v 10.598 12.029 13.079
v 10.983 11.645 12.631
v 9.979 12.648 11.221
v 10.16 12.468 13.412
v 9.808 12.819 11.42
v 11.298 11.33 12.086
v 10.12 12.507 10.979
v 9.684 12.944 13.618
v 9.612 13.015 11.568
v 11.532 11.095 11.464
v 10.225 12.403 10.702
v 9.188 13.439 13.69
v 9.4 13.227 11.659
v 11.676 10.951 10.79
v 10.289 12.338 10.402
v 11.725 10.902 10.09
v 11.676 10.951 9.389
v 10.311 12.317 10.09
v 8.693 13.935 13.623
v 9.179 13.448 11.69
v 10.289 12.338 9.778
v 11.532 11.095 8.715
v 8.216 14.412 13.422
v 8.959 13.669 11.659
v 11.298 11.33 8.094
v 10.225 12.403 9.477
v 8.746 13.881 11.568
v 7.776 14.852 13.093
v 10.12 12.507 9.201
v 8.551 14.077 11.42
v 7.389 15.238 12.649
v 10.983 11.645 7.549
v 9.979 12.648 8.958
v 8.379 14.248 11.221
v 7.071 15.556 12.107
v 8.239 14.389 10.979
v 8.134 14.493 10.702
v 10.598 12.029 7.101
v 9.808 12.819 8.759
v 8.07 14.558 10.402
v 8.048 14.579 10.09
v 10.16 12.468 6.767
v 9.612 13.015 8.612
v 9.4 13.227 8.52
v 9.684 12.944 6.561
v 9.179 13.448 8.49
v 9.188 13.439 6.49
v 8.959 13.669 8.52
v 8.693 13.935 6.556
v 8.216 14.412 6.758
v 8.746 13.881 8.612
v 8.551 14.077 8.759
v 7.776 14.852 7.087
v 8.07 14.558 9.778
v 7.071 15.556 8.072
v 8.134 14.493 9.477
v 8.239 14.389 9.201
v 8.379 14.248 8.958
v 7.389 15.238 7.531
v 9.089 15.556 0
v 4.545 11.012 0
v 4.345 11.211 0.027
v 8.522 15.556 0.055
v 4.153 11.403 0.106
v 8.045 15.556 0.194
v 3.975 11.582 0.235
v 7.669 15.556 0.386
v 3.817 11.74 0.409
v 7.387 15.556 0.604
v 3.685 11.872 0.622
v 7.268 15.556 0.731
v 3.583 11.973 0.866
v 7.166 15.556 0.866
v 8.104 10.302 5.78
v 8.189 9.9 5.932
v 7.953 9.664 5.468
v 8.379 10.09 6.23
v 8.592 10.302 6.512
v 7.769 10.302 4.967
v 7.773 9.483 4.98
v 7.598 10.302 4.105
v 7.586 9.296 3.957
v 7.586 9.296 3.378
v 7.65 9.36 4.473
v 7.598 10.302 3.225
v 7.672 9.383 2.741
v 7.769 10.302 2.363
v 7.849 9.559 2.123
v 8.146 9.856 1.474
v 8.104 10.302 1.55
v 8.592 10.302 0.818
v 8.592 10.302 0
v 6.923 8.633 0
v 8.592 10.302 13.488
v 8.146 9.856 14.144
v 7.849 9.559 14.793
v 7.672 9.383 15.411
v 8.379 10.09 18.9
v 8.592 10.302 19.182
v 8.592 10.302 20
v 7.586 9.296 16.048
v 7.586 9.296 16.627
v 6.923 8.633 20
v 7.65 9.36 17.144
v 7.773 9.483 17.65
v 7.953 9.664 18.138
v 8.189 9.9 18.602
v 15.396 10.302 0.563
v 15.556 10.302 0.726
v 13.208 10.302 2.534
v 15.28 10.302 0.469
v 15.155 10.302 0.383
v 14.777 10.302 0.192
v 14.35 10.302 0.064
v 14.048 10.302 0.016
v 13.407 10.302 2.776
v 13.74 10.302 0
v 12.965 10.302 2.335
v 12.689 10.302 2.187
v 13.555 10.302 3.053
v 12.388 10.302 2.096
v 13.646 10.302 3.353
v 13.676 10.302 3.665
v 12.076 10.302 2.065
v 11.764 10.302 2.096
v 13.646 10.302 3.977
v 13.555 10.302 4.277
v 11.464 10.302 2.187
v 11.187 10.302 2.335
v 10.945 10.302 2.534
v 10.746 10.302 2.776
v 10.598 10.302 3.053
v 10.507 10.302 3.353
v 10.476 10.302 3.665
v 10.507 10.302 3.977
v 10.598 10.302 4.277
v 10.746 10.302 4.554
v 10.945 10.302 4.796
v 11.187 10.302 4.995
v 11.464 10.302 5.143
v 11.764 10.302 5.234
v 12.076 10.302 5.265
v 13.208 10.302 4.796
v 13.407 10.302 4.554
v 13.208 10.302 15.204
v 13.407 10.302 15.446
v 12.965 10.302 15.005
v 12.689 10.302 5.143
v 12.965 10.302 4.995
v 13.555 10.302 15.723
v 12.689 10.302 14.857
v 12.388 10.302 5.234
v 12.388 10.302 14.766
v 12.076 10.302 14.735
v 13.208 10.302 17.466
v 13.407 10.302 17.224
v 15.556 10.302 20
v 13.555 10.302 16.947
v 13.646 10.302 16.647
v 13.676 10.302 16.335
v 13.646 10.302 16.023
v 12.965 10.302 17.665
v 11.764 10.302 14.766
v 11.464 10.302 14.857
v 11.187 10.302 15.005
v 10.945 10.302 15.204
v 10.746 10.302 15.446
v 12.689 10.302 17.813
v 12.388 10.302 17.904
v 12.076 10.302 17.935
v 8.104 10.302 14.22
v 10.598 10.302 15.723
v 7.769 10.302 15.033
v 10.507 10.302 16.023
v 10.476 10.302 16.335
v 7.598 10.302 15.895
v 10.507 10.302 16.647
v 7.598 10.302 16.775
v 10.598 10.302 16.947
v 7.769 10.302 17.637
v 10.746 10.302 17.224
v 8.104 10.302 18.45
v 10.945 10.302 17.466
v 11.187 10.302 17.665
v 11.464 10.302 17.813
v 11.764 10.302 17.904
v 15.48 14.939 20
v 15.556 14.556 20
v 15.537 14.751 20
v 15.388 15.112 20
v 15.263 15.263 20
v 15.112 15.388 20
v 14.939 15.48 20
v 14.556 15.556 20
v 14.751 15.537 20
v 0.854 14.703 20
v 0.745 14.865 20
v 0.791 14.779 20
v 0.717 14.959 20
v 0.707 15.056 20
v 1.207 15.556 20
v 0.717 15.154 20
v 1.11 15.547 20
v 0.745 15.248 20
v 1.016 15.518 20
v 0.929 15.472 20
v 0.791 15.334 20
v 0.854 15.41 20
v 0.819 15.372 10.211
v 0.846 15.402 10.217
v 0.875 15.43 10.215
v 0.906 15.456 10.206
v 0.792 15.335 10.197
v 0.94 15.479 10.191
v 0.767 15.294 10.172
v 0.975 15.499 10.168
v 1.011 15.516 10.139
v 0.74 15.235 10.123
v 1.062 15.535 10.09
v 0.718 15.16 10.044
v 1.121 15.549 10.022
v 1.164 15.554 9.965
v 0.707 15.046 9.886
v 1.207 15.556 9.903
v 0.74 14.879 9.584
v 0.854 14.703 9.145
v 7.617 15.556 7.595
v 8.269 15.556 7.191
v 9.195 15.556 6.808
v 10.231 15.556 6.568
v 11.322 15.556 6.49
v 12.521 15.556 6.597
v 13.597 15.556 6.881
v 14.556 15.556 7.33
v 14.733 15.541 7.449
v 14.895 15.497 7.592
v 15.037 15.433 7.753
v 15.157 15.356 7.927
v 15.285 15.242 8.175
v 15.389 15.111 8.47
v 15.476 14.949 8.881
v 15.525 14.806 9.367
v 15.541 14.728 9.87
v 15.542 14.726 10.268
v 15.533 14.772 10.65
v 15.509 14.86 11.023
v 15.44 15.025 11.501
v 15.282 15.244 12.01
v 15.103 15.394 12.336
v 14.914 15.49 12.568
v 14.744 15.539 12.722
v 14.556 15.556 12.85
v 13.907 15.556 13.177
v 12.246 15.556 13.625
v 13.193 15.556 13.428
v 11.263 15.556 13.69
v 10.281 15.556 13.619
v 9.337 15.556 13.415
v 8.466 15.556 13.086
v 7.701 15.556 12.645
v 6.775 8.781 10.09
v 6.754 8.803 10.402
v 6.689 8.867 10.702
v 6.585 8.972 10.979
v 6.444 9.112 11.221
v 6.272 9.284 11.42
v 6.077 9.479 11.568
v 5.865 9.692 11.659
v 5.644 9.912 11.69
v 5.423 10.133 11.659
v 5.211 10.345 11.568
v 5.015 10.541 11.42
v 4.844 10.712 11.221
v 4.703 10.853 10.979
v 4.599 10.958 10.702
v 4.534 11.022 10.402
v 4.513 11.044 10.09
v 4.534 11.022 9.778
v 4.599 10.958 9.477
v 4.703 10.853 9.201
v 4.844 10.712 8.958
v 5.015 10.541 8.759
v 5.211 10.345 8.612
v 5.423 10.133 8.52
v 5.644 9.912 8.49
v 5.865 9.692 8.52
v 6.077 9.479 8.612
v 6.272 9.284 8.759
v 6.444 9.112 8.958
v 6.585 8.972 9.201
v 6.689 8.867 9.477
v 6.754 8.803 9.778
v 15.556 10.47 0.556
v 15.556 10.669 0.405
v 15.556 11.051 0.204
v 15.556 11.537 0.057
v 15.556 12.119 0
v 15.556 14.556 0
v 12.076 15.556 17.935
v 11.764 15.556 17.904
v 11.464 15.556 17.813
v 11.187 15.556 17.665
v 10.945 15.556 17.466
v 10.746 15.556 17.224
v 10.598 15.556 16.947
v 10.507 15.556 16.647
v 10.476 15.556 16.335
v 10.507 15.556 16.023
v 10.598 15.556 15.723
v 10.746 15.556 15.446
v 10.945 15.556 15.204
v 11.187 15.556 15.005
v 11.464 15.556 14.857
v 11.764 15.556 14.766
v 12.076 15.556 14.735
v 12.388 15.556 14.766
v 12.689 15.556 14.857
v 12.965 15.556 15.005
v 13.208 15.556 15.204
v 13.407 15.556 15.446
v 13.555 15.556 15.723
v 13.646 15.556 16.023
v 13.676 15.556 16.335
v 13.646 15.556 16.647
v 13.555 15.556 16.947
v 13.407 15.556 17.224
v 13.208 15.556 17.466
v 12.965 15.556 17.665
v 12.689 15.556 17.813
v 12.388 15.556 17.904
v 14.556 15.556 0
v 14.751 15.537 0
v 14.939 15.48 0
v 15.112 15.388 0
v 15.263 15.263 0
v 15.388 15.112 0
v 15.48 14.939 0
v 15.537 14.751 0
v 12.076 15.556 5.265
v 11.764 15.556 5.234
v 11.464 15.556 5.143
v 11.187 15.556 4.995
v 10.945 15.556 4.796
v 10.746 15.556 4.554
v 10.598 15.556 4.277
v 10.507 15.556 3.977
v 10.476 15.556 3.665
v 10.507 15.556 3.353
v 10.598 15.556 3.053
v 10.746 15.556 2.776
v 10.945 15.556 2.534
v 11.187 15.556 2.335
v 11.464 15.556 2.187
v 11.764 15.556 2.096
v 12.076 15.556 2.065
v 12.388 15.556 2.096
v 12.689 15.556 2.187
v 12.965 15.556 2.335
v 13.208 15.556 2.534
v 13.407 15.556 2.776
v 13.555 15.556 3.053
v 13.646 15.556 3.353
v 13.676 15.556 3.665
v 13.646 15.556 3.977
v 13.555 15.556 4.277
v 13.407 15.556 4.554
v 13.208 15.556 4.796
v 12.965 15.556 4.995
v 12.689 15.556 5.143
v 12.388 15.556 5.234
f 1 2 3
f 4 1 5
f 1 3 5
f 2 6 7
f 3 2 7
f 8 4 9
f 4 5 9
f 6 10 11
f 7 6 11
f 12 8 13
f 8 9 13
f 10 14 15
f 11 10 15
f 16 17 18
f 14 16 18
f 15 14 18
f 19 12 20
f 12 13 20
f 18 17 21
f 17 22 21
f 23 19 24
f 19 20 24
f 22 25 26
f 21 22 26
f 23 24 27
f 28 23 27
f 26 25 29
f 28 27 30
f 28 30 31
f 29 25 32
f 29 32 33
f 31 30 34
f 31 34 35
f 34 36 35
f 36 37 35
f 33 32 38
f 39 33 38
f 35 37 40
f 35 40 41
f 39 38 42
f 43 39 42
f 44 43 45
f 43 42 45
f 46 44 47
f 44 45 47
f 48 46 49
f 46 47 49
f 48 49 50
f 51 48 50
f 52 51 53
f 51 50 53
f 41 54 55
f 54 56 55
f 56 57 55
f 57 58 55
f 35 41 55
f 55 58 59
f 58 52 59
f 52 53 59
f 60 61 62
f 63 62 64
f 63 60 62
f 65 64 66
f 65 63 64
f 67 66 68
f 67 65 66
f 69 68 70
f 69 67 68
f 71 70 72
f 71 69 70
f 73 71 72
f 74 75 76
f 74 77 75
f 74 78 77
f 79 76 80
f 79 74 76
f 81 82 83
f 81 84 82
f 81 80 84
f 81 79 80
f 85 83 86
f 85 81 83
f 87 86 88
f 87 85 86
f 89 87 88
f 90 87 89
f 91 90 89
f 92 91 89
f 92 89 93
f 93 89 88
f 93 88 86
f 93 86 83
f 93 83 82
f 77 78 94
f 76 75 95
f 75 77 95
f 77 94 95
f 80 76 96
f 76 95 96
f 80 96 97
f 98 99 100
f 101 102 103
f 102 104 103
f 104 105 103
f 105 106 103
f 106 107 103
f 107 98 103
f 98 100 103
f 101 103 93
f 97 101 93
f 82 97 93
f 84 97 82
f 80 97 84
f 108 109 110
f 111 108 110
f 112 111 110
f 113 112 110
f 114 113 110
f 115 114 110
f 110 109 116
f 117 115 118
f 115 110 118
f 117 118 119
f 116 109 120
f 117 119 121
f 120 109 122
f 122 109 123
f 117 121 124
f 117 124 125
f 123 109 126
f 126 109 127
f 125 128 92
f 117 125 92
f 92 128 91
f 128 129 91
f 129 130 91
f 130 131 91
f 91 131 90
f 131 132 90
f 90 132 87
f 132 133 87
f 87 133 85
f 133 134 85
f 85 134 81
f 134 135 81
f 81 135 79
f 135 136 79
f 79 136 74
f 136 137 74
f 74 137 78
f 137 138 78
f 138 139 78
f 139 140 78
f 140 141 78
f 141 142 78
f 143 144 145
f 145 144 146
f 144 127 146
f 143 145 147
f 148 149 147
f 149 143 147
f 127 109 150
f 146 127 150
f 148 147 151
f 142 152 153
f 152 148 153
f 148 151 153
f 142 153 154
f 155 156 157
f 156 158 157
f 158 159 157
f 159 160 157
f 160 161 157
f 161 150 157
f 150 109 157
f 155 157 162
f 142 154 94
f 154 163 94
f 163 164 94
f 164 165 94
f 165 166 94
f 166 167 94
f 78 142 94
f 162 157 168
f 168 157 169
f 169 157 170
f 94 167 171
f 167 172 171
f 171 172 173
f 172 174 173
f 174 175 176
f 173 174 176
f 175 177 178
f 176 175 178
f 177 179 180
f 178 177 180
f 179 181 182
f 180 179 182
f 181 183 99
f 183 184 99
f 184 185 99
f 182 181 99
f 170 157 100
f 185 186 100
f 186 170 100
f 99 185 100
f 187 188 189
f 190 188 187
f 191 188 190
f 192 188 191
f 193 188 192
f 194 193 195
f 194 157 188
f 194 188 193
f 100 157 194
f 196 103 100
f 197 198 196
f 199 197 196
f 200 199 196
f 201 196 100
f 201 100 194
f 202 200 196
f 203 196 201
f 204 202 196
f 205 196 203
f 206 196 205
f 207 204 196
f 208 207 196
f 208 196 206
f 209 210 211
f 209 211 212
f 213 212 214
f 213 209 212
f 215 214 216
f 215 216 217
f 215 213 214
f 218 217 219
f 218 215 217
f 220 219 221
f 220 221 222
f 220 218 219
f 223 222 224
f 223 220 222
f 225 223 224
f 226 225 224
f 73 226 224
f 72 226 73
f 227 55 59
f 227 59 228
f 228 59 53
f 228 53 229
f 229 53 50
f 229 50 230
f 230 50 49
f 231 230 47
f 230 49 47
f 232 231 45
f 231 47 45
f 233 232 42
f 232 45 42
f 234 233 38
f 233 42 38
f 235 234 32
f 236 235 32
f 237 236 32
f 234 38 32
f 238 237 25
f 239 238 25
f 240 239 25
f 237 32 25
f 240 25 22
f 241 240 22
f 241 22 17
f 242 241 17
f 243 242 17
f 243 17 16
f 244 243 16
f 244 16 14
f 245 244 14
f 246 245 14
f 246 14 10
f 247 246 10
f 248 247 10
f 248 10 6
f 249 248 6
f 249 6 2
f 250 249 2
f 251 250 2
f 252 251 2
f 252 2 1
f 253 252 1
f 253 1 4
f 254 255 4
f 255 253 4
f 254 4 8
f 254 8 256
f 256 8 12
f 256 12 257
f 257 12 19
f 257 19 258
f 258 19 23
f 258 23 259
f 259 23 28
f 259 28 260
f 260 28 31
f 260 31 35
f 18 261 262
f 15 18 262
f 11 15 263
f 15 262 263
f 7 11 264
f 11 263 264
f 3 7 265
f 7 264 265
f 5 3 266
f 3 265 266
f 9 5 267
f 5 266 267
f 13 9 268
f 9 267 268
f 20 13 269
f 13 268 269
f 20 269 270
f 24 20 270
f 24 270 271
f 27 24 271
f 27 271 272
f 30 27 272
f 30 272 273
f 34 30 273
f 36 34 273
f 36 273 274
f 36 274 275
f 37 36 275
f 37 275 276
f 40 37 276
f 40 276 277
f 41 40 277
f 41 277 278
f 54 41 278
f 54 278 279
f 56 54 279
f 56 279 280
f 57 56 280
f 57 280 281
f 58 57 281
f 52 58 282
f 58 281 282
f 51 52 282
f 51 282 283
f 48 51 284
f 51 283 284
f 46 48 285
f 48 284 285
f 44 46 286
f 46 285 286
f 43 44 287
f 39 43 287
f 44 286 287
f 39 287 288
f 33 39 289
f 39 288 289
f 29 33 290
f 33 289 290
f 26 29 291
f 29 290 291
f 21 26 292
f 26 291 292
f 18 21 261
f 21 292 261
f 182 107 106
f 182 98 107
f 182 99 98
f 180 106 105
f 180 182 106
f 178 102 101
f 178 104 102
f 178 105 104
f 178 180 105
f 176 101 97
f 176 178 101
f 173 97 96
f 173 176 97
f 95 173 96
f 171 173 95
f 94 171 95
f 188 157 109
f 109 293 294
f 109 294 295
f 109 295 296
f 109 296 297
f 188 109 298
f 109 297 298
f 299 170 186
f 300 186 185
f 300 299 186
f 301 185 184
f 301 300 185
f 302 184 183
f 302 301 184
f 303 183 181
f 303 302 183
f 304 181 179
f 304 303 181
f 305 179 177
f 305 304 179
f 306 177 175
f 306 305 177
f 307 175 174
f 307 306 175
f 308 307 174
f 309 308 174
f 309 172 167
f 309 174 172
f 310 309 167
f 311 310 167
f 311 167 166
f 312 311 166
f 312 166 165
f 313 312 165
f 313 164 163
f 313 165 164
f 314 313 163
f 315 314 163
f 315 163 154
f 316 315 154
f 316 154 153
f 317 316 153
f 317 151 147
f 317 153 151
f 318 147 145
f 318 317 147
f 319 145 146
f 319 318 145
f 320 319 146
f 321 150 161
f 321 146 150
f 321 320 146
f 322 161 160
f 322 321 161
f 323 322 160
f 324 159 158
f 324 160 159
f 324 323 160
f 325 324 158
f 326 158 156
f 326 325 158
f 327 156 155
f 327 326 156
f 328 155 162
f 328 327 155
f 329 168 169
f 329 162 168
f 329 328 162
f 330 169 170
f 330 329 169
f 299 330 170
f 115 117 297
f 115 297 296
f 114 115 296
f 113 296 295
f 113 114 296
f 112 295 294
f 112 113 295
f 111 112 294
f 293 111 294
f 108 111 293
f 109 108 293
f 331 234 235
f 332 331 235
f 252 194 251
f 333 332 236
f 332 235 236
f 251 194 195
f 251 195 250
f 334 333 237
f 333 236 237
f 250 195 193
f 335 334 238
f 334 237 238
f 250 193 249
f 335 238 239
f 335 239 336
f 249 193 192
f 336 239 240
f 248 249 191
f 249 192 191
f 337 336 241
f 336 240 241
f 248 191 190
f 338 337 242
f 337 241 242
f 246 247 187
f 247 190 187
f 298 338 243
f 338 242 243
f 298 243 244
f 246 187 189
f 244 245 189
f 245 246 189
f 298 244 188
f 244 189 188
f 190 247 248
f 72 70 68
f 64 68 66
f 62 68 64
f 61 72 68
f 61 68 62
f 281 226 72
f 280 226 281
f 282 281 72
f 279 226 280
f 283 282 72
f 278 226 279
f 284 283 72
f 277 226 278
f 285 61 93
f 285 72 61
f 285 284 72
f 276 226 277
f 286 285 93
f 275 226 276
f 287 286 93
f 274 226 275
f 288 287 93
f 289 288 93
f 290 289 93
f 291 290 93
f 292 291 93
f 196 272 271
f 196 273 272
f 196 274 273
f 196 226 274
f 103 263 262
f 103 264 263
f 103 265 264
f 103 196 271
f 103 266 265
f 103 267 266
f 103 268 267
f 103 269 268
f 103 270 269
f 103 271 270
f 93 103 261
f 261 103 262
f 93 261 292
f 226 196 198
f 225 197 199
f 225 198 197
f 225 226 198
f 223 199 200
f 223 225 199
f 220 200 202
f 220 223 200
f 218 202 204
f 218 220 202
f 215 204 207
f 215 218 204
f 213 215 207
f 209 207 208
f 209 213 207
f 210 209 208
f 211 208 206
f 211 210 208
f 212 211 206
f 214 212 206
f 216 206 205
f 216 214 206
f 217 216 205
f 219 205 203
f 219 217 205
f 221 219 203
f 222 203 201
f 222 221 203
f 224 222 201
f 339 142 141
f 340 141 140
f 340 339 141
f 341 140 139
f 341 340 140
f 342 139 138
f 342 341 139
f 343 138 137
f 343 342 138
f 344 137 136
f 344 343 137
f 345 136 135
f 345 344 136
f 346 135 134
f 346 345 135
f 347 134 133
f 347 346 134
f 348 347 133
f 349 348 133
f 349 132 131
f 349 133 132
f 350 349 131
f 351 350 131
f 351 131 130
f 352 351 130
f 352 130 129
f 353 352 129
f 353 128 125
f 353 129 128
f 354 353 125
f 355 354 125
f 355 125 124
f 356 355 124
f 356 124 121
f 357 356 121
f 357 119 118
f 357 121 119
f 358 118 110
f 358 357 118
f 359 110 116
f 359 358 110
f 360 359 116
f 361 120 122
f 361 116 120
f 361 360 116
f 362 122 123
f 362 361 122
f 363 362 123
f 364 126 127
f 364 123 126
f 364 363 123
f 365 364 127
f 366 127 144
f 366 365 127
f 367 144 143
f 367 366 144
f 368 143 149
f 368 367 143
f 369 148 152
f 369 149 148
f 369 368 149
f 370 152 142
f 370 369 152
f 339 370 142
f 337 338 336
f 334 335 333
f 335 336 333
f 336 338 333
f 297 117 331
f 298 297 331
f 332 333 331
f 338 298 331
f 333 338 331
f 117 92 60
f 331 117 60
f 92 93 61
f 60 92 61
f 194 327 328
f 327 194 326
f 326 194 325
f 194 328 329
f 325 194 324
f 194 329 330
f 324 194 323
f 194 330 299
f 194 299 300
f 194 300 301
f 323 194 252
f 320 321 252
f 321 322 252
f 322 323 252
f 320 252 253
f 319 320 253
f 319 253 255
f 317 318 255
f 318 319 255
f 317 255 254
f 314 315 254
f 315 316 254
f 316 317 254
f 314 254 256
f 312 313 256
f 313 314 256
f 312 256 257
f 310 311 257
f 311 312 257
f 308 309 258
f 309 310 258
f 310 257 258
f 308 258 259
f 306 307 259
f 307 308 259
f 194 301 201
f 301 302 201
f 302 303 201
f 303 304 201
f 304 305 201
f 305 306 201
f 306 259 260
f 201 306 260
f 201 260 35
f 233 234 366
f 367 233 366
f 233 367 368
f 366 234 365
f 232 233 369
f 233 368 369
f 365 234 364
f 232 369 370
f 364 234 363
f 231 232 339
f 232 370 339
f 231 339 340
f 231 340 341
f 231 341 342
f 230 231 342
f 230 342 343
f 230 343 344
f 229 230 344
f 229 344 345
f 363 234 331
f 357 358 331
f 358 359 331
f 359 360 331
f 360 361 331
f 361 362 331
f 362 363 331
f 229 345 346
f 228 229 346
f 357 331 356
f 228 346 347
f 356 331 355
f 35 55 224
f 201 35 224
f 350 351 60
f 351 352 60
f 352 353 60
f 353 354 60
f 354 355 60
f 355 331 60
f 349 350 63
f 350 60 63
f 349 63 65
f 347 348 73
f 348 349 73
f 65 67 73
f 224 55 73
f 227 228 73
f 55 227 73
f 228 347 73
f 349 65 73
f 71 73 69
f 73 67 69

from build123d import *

# Parameters (mm, degrees)
BOSS_EXTRUDE1_DEPTH = 20
SKETCH6_R           = 1.6
CUT_EXTRUDE4_DEPTH  = 30.732137495
SKETCH7_R           = 2.7
CUT_EXTRUDE5_DEPTH  = 28.079952174
FILLET4_R           = 1
FILLET5_R           = 0.5
CUT_EXTRUDE6_DEPTH  = 10
CUT_EXTRUDE7_DEPTH  = 10
FILLET6_R           = 1.5
CUT_EXTRUDE8_DEPTH  = 26
SKETCH11_R          = 1.6
CUT_EXTRUDE9_DEPTH  = 26
SKETCH12_R          = 3.6
CUT_EXTRUDE10_DEPTH = 10
CUT_EXTRUDE13_DEPTH = 25
SKETCH14_R          = 4.5
CUT_EXTRUDE14_DEPTH = 10


# Read off the part's stored shape, not the designer's step: Mirror1
with BuildPart() as part:
    # Sketch1 → Boss-Extrude1 (new body)
    with BuildSketch(Plane.XY):
        Polygon((0, 0), (0, 15.556349186), (15.556349186, 0), align=None)
    extrude(amount=BOSS_EXTRUDE1_DEPTH)

    # Sketch6 → Cut-Extrude4 (cut, through all)
    with BuildSketch(Plane.ZY):
        with Locations((16.335044769, 3.48)):
            Circle(SKETCH6_R)
        with Locations((3.664955231, 3.48)):
            Circle(SKETCH6_R)
    extrude(amount=-CUT_EXTRUDE4_DEPTH, mode=Mode.SUBTRACT)

    # Sketch7 → Cut-Extrude5 (cut, through all)
    with BuildSketch(Plane.ZY.offset(-6)):
        with Locations((16.335044769, 3.48)):
            Circle(SKETCH7_R)
        with Locations((3.664955231, 3.48)):
            Circle(SKETCH7_R)
    extrude(amount=-CUT_EXTRUDE5_DEPTH, mode=Mode.SUBTRACT)

    # Fillet4
    fillet4_edges = [part.edges().sort_by_distance(p)[0] for p in [
        (0, 0, 10),
    ]]
    fillet(fillet4_edges, radius=FILLET4_R)

    # Fillet5
    # the kernel refuses this fillet: 0.5 mm, written as the material it takes off along each edge
    with BuildSketch(Plane(origin=(15.556349186, 0, -3.017766953), x_dir=(-0.7071067811865474, 0.7071067811865477, 0), z_dir=(0, 0, 1)), Plane(origin=(0, 15.556349186, -3.017766953), x_dir=(0, -1, 0), z_dir=(0, 0, 1))) as fillet5_piece_1:
        with BuildLine():
            CenterArc((FILLET5_R * 2.41421356237, FILLET5_R), FILLET5_R, 135, 135)
            Line((FILLET5_R * 1.70710678119, FILLET5_R * 1.70710678119), (0, 0))
            Line((0, 0), (FILLET5_R * 2.41421356237, 0))
        make_face()
    extrude(amount=26.035533906, mode=Mode.SUBTRACT)

    # Sketch8 → Cut-Extrude6 (cut)
    with BuildSketch(Plane(origin=(7.778174593, 7.778174593, 0), x_dir=(0, 0, -1), z_dir=(0.7071067811865477, 0.7071067811865475, 0))):
        Polygon((-20, -12.333051339), (0, -12.333051339), (0.012190886, -3.93058749), (-20, -3.93058749), align=None)
    extrude(amount=-CUT_EXTRUDE6_DEPTH, mode=Mode.SUBTRACT)

    # Sketch9 → Cut-Extrude7 (cut)
    with BuildSketch(Plane(origin=(7.778174593, 7.778174593, 0), x_dir=(0, 0, -1), z_dir=(0.7071067811865477, 0.7071067811865475, 0))):
        Polygon((-11.323221056, 10.808771842), (0, 5.528667149), (0, 10.808771842), align=None)
    extrude(amount=-CUT_EXTRUDE7_DEPTH, mode=Mode.SUBTRACT)

    # Fillet6
    fillet6_edges = [part.edges().sort_by_distance(p)[0] for p in [
        (8.058104899, 2.499414762, 0),
        (1.934408281, 9.753124344, 0),
    ]]
    fillet(fillet6_edges, radius=FILLET6_R)

    # Mirror1: part across plane


with BuildPart() as part_1:
    add(part.part)
    add(part.part.mirror(Plane(origin=(0, 15.556349186, 20), x_dir=(0, 0, 1), z_dir=(-0.7071067811865476, -0.7071067811865476, 0))))

    # Sketch10 → Cut-Extrude8 (cut)
    with BuildSketch(Plane.XY.offset(20)):
        Polygon((0.853553391, 14.702795796), (12.695020556, 2.86132863), (4.968641211, -4.865050714), (-9.455036557, 9.558627055), (-1.728657213, 17.285006399), align=None)
    extrude(amount=-CUT_EXTRUDE8_DEPTH, mode=Mode.SUBTRACT)

    # Sketch11 → Cut-Extrude9 (cut)
    with BuildSketch(Plane(origin=(7.778174593, 7.778174593, 0), x_dir=(0, 0, 1), z_dir=(-0.7071067811865477, -0.7071067811865475, 0))):
        with Locations(Location((10.089715554, 3.018295217, 0), (0, 0, 270))):
            Circle(SKETCH11_R)
    extrude(amount=-CUT_EXTRUDE9_DEPTH, mode=Mode.SUBTRACT)

    # Sketch12 → Cut-Extrude10 (cut)
    with BuildSketch(Plane(origin=(11.313708499, 11.313708499, 0), x_dir=(-0.7071067811865475, 0.7071067811865477, 0), z_dir=(-0.7071067811865477, -0.7071067811865475, 0))):
        with Locations((3.018295217, -10.089715554)):
            Circle(SKETCH12_R)
    extrude(amount=-CUT_EXTRUDE10_DEPTH, mode=Mode.SUBTRACT)

    # Sketch13 → Cut-Extrude13 (cut)
    with BuildSketch(Plane.XY.offset(20)):
        Polygon((15.86082052, 10.302130384), (8.59176281, 10.302130384), (6.922990806, 8.63335838), (10.557519661, 4.998829525), align=None)
    extrude(amount=-CUT_EXTRUDE13_DEPTH, mode=Mode.SUBTRACT)

    # Sketch14 → Cut-Extrude14 (cut)
    with BuildSketch(Plane.XZ.offset(-10.302130384)):
        with Locations((12.076349186, 16.335044769)):
            Circle(SKETCH14_R)
        with Locations((12.076349186, 3.664955231)):
            Circle(SKETCH14_R)
    extrude(amount=CUT_EXTRUDE14_DEPTH, mode=Mode.SUBTRACT)


solid = part_1.part
